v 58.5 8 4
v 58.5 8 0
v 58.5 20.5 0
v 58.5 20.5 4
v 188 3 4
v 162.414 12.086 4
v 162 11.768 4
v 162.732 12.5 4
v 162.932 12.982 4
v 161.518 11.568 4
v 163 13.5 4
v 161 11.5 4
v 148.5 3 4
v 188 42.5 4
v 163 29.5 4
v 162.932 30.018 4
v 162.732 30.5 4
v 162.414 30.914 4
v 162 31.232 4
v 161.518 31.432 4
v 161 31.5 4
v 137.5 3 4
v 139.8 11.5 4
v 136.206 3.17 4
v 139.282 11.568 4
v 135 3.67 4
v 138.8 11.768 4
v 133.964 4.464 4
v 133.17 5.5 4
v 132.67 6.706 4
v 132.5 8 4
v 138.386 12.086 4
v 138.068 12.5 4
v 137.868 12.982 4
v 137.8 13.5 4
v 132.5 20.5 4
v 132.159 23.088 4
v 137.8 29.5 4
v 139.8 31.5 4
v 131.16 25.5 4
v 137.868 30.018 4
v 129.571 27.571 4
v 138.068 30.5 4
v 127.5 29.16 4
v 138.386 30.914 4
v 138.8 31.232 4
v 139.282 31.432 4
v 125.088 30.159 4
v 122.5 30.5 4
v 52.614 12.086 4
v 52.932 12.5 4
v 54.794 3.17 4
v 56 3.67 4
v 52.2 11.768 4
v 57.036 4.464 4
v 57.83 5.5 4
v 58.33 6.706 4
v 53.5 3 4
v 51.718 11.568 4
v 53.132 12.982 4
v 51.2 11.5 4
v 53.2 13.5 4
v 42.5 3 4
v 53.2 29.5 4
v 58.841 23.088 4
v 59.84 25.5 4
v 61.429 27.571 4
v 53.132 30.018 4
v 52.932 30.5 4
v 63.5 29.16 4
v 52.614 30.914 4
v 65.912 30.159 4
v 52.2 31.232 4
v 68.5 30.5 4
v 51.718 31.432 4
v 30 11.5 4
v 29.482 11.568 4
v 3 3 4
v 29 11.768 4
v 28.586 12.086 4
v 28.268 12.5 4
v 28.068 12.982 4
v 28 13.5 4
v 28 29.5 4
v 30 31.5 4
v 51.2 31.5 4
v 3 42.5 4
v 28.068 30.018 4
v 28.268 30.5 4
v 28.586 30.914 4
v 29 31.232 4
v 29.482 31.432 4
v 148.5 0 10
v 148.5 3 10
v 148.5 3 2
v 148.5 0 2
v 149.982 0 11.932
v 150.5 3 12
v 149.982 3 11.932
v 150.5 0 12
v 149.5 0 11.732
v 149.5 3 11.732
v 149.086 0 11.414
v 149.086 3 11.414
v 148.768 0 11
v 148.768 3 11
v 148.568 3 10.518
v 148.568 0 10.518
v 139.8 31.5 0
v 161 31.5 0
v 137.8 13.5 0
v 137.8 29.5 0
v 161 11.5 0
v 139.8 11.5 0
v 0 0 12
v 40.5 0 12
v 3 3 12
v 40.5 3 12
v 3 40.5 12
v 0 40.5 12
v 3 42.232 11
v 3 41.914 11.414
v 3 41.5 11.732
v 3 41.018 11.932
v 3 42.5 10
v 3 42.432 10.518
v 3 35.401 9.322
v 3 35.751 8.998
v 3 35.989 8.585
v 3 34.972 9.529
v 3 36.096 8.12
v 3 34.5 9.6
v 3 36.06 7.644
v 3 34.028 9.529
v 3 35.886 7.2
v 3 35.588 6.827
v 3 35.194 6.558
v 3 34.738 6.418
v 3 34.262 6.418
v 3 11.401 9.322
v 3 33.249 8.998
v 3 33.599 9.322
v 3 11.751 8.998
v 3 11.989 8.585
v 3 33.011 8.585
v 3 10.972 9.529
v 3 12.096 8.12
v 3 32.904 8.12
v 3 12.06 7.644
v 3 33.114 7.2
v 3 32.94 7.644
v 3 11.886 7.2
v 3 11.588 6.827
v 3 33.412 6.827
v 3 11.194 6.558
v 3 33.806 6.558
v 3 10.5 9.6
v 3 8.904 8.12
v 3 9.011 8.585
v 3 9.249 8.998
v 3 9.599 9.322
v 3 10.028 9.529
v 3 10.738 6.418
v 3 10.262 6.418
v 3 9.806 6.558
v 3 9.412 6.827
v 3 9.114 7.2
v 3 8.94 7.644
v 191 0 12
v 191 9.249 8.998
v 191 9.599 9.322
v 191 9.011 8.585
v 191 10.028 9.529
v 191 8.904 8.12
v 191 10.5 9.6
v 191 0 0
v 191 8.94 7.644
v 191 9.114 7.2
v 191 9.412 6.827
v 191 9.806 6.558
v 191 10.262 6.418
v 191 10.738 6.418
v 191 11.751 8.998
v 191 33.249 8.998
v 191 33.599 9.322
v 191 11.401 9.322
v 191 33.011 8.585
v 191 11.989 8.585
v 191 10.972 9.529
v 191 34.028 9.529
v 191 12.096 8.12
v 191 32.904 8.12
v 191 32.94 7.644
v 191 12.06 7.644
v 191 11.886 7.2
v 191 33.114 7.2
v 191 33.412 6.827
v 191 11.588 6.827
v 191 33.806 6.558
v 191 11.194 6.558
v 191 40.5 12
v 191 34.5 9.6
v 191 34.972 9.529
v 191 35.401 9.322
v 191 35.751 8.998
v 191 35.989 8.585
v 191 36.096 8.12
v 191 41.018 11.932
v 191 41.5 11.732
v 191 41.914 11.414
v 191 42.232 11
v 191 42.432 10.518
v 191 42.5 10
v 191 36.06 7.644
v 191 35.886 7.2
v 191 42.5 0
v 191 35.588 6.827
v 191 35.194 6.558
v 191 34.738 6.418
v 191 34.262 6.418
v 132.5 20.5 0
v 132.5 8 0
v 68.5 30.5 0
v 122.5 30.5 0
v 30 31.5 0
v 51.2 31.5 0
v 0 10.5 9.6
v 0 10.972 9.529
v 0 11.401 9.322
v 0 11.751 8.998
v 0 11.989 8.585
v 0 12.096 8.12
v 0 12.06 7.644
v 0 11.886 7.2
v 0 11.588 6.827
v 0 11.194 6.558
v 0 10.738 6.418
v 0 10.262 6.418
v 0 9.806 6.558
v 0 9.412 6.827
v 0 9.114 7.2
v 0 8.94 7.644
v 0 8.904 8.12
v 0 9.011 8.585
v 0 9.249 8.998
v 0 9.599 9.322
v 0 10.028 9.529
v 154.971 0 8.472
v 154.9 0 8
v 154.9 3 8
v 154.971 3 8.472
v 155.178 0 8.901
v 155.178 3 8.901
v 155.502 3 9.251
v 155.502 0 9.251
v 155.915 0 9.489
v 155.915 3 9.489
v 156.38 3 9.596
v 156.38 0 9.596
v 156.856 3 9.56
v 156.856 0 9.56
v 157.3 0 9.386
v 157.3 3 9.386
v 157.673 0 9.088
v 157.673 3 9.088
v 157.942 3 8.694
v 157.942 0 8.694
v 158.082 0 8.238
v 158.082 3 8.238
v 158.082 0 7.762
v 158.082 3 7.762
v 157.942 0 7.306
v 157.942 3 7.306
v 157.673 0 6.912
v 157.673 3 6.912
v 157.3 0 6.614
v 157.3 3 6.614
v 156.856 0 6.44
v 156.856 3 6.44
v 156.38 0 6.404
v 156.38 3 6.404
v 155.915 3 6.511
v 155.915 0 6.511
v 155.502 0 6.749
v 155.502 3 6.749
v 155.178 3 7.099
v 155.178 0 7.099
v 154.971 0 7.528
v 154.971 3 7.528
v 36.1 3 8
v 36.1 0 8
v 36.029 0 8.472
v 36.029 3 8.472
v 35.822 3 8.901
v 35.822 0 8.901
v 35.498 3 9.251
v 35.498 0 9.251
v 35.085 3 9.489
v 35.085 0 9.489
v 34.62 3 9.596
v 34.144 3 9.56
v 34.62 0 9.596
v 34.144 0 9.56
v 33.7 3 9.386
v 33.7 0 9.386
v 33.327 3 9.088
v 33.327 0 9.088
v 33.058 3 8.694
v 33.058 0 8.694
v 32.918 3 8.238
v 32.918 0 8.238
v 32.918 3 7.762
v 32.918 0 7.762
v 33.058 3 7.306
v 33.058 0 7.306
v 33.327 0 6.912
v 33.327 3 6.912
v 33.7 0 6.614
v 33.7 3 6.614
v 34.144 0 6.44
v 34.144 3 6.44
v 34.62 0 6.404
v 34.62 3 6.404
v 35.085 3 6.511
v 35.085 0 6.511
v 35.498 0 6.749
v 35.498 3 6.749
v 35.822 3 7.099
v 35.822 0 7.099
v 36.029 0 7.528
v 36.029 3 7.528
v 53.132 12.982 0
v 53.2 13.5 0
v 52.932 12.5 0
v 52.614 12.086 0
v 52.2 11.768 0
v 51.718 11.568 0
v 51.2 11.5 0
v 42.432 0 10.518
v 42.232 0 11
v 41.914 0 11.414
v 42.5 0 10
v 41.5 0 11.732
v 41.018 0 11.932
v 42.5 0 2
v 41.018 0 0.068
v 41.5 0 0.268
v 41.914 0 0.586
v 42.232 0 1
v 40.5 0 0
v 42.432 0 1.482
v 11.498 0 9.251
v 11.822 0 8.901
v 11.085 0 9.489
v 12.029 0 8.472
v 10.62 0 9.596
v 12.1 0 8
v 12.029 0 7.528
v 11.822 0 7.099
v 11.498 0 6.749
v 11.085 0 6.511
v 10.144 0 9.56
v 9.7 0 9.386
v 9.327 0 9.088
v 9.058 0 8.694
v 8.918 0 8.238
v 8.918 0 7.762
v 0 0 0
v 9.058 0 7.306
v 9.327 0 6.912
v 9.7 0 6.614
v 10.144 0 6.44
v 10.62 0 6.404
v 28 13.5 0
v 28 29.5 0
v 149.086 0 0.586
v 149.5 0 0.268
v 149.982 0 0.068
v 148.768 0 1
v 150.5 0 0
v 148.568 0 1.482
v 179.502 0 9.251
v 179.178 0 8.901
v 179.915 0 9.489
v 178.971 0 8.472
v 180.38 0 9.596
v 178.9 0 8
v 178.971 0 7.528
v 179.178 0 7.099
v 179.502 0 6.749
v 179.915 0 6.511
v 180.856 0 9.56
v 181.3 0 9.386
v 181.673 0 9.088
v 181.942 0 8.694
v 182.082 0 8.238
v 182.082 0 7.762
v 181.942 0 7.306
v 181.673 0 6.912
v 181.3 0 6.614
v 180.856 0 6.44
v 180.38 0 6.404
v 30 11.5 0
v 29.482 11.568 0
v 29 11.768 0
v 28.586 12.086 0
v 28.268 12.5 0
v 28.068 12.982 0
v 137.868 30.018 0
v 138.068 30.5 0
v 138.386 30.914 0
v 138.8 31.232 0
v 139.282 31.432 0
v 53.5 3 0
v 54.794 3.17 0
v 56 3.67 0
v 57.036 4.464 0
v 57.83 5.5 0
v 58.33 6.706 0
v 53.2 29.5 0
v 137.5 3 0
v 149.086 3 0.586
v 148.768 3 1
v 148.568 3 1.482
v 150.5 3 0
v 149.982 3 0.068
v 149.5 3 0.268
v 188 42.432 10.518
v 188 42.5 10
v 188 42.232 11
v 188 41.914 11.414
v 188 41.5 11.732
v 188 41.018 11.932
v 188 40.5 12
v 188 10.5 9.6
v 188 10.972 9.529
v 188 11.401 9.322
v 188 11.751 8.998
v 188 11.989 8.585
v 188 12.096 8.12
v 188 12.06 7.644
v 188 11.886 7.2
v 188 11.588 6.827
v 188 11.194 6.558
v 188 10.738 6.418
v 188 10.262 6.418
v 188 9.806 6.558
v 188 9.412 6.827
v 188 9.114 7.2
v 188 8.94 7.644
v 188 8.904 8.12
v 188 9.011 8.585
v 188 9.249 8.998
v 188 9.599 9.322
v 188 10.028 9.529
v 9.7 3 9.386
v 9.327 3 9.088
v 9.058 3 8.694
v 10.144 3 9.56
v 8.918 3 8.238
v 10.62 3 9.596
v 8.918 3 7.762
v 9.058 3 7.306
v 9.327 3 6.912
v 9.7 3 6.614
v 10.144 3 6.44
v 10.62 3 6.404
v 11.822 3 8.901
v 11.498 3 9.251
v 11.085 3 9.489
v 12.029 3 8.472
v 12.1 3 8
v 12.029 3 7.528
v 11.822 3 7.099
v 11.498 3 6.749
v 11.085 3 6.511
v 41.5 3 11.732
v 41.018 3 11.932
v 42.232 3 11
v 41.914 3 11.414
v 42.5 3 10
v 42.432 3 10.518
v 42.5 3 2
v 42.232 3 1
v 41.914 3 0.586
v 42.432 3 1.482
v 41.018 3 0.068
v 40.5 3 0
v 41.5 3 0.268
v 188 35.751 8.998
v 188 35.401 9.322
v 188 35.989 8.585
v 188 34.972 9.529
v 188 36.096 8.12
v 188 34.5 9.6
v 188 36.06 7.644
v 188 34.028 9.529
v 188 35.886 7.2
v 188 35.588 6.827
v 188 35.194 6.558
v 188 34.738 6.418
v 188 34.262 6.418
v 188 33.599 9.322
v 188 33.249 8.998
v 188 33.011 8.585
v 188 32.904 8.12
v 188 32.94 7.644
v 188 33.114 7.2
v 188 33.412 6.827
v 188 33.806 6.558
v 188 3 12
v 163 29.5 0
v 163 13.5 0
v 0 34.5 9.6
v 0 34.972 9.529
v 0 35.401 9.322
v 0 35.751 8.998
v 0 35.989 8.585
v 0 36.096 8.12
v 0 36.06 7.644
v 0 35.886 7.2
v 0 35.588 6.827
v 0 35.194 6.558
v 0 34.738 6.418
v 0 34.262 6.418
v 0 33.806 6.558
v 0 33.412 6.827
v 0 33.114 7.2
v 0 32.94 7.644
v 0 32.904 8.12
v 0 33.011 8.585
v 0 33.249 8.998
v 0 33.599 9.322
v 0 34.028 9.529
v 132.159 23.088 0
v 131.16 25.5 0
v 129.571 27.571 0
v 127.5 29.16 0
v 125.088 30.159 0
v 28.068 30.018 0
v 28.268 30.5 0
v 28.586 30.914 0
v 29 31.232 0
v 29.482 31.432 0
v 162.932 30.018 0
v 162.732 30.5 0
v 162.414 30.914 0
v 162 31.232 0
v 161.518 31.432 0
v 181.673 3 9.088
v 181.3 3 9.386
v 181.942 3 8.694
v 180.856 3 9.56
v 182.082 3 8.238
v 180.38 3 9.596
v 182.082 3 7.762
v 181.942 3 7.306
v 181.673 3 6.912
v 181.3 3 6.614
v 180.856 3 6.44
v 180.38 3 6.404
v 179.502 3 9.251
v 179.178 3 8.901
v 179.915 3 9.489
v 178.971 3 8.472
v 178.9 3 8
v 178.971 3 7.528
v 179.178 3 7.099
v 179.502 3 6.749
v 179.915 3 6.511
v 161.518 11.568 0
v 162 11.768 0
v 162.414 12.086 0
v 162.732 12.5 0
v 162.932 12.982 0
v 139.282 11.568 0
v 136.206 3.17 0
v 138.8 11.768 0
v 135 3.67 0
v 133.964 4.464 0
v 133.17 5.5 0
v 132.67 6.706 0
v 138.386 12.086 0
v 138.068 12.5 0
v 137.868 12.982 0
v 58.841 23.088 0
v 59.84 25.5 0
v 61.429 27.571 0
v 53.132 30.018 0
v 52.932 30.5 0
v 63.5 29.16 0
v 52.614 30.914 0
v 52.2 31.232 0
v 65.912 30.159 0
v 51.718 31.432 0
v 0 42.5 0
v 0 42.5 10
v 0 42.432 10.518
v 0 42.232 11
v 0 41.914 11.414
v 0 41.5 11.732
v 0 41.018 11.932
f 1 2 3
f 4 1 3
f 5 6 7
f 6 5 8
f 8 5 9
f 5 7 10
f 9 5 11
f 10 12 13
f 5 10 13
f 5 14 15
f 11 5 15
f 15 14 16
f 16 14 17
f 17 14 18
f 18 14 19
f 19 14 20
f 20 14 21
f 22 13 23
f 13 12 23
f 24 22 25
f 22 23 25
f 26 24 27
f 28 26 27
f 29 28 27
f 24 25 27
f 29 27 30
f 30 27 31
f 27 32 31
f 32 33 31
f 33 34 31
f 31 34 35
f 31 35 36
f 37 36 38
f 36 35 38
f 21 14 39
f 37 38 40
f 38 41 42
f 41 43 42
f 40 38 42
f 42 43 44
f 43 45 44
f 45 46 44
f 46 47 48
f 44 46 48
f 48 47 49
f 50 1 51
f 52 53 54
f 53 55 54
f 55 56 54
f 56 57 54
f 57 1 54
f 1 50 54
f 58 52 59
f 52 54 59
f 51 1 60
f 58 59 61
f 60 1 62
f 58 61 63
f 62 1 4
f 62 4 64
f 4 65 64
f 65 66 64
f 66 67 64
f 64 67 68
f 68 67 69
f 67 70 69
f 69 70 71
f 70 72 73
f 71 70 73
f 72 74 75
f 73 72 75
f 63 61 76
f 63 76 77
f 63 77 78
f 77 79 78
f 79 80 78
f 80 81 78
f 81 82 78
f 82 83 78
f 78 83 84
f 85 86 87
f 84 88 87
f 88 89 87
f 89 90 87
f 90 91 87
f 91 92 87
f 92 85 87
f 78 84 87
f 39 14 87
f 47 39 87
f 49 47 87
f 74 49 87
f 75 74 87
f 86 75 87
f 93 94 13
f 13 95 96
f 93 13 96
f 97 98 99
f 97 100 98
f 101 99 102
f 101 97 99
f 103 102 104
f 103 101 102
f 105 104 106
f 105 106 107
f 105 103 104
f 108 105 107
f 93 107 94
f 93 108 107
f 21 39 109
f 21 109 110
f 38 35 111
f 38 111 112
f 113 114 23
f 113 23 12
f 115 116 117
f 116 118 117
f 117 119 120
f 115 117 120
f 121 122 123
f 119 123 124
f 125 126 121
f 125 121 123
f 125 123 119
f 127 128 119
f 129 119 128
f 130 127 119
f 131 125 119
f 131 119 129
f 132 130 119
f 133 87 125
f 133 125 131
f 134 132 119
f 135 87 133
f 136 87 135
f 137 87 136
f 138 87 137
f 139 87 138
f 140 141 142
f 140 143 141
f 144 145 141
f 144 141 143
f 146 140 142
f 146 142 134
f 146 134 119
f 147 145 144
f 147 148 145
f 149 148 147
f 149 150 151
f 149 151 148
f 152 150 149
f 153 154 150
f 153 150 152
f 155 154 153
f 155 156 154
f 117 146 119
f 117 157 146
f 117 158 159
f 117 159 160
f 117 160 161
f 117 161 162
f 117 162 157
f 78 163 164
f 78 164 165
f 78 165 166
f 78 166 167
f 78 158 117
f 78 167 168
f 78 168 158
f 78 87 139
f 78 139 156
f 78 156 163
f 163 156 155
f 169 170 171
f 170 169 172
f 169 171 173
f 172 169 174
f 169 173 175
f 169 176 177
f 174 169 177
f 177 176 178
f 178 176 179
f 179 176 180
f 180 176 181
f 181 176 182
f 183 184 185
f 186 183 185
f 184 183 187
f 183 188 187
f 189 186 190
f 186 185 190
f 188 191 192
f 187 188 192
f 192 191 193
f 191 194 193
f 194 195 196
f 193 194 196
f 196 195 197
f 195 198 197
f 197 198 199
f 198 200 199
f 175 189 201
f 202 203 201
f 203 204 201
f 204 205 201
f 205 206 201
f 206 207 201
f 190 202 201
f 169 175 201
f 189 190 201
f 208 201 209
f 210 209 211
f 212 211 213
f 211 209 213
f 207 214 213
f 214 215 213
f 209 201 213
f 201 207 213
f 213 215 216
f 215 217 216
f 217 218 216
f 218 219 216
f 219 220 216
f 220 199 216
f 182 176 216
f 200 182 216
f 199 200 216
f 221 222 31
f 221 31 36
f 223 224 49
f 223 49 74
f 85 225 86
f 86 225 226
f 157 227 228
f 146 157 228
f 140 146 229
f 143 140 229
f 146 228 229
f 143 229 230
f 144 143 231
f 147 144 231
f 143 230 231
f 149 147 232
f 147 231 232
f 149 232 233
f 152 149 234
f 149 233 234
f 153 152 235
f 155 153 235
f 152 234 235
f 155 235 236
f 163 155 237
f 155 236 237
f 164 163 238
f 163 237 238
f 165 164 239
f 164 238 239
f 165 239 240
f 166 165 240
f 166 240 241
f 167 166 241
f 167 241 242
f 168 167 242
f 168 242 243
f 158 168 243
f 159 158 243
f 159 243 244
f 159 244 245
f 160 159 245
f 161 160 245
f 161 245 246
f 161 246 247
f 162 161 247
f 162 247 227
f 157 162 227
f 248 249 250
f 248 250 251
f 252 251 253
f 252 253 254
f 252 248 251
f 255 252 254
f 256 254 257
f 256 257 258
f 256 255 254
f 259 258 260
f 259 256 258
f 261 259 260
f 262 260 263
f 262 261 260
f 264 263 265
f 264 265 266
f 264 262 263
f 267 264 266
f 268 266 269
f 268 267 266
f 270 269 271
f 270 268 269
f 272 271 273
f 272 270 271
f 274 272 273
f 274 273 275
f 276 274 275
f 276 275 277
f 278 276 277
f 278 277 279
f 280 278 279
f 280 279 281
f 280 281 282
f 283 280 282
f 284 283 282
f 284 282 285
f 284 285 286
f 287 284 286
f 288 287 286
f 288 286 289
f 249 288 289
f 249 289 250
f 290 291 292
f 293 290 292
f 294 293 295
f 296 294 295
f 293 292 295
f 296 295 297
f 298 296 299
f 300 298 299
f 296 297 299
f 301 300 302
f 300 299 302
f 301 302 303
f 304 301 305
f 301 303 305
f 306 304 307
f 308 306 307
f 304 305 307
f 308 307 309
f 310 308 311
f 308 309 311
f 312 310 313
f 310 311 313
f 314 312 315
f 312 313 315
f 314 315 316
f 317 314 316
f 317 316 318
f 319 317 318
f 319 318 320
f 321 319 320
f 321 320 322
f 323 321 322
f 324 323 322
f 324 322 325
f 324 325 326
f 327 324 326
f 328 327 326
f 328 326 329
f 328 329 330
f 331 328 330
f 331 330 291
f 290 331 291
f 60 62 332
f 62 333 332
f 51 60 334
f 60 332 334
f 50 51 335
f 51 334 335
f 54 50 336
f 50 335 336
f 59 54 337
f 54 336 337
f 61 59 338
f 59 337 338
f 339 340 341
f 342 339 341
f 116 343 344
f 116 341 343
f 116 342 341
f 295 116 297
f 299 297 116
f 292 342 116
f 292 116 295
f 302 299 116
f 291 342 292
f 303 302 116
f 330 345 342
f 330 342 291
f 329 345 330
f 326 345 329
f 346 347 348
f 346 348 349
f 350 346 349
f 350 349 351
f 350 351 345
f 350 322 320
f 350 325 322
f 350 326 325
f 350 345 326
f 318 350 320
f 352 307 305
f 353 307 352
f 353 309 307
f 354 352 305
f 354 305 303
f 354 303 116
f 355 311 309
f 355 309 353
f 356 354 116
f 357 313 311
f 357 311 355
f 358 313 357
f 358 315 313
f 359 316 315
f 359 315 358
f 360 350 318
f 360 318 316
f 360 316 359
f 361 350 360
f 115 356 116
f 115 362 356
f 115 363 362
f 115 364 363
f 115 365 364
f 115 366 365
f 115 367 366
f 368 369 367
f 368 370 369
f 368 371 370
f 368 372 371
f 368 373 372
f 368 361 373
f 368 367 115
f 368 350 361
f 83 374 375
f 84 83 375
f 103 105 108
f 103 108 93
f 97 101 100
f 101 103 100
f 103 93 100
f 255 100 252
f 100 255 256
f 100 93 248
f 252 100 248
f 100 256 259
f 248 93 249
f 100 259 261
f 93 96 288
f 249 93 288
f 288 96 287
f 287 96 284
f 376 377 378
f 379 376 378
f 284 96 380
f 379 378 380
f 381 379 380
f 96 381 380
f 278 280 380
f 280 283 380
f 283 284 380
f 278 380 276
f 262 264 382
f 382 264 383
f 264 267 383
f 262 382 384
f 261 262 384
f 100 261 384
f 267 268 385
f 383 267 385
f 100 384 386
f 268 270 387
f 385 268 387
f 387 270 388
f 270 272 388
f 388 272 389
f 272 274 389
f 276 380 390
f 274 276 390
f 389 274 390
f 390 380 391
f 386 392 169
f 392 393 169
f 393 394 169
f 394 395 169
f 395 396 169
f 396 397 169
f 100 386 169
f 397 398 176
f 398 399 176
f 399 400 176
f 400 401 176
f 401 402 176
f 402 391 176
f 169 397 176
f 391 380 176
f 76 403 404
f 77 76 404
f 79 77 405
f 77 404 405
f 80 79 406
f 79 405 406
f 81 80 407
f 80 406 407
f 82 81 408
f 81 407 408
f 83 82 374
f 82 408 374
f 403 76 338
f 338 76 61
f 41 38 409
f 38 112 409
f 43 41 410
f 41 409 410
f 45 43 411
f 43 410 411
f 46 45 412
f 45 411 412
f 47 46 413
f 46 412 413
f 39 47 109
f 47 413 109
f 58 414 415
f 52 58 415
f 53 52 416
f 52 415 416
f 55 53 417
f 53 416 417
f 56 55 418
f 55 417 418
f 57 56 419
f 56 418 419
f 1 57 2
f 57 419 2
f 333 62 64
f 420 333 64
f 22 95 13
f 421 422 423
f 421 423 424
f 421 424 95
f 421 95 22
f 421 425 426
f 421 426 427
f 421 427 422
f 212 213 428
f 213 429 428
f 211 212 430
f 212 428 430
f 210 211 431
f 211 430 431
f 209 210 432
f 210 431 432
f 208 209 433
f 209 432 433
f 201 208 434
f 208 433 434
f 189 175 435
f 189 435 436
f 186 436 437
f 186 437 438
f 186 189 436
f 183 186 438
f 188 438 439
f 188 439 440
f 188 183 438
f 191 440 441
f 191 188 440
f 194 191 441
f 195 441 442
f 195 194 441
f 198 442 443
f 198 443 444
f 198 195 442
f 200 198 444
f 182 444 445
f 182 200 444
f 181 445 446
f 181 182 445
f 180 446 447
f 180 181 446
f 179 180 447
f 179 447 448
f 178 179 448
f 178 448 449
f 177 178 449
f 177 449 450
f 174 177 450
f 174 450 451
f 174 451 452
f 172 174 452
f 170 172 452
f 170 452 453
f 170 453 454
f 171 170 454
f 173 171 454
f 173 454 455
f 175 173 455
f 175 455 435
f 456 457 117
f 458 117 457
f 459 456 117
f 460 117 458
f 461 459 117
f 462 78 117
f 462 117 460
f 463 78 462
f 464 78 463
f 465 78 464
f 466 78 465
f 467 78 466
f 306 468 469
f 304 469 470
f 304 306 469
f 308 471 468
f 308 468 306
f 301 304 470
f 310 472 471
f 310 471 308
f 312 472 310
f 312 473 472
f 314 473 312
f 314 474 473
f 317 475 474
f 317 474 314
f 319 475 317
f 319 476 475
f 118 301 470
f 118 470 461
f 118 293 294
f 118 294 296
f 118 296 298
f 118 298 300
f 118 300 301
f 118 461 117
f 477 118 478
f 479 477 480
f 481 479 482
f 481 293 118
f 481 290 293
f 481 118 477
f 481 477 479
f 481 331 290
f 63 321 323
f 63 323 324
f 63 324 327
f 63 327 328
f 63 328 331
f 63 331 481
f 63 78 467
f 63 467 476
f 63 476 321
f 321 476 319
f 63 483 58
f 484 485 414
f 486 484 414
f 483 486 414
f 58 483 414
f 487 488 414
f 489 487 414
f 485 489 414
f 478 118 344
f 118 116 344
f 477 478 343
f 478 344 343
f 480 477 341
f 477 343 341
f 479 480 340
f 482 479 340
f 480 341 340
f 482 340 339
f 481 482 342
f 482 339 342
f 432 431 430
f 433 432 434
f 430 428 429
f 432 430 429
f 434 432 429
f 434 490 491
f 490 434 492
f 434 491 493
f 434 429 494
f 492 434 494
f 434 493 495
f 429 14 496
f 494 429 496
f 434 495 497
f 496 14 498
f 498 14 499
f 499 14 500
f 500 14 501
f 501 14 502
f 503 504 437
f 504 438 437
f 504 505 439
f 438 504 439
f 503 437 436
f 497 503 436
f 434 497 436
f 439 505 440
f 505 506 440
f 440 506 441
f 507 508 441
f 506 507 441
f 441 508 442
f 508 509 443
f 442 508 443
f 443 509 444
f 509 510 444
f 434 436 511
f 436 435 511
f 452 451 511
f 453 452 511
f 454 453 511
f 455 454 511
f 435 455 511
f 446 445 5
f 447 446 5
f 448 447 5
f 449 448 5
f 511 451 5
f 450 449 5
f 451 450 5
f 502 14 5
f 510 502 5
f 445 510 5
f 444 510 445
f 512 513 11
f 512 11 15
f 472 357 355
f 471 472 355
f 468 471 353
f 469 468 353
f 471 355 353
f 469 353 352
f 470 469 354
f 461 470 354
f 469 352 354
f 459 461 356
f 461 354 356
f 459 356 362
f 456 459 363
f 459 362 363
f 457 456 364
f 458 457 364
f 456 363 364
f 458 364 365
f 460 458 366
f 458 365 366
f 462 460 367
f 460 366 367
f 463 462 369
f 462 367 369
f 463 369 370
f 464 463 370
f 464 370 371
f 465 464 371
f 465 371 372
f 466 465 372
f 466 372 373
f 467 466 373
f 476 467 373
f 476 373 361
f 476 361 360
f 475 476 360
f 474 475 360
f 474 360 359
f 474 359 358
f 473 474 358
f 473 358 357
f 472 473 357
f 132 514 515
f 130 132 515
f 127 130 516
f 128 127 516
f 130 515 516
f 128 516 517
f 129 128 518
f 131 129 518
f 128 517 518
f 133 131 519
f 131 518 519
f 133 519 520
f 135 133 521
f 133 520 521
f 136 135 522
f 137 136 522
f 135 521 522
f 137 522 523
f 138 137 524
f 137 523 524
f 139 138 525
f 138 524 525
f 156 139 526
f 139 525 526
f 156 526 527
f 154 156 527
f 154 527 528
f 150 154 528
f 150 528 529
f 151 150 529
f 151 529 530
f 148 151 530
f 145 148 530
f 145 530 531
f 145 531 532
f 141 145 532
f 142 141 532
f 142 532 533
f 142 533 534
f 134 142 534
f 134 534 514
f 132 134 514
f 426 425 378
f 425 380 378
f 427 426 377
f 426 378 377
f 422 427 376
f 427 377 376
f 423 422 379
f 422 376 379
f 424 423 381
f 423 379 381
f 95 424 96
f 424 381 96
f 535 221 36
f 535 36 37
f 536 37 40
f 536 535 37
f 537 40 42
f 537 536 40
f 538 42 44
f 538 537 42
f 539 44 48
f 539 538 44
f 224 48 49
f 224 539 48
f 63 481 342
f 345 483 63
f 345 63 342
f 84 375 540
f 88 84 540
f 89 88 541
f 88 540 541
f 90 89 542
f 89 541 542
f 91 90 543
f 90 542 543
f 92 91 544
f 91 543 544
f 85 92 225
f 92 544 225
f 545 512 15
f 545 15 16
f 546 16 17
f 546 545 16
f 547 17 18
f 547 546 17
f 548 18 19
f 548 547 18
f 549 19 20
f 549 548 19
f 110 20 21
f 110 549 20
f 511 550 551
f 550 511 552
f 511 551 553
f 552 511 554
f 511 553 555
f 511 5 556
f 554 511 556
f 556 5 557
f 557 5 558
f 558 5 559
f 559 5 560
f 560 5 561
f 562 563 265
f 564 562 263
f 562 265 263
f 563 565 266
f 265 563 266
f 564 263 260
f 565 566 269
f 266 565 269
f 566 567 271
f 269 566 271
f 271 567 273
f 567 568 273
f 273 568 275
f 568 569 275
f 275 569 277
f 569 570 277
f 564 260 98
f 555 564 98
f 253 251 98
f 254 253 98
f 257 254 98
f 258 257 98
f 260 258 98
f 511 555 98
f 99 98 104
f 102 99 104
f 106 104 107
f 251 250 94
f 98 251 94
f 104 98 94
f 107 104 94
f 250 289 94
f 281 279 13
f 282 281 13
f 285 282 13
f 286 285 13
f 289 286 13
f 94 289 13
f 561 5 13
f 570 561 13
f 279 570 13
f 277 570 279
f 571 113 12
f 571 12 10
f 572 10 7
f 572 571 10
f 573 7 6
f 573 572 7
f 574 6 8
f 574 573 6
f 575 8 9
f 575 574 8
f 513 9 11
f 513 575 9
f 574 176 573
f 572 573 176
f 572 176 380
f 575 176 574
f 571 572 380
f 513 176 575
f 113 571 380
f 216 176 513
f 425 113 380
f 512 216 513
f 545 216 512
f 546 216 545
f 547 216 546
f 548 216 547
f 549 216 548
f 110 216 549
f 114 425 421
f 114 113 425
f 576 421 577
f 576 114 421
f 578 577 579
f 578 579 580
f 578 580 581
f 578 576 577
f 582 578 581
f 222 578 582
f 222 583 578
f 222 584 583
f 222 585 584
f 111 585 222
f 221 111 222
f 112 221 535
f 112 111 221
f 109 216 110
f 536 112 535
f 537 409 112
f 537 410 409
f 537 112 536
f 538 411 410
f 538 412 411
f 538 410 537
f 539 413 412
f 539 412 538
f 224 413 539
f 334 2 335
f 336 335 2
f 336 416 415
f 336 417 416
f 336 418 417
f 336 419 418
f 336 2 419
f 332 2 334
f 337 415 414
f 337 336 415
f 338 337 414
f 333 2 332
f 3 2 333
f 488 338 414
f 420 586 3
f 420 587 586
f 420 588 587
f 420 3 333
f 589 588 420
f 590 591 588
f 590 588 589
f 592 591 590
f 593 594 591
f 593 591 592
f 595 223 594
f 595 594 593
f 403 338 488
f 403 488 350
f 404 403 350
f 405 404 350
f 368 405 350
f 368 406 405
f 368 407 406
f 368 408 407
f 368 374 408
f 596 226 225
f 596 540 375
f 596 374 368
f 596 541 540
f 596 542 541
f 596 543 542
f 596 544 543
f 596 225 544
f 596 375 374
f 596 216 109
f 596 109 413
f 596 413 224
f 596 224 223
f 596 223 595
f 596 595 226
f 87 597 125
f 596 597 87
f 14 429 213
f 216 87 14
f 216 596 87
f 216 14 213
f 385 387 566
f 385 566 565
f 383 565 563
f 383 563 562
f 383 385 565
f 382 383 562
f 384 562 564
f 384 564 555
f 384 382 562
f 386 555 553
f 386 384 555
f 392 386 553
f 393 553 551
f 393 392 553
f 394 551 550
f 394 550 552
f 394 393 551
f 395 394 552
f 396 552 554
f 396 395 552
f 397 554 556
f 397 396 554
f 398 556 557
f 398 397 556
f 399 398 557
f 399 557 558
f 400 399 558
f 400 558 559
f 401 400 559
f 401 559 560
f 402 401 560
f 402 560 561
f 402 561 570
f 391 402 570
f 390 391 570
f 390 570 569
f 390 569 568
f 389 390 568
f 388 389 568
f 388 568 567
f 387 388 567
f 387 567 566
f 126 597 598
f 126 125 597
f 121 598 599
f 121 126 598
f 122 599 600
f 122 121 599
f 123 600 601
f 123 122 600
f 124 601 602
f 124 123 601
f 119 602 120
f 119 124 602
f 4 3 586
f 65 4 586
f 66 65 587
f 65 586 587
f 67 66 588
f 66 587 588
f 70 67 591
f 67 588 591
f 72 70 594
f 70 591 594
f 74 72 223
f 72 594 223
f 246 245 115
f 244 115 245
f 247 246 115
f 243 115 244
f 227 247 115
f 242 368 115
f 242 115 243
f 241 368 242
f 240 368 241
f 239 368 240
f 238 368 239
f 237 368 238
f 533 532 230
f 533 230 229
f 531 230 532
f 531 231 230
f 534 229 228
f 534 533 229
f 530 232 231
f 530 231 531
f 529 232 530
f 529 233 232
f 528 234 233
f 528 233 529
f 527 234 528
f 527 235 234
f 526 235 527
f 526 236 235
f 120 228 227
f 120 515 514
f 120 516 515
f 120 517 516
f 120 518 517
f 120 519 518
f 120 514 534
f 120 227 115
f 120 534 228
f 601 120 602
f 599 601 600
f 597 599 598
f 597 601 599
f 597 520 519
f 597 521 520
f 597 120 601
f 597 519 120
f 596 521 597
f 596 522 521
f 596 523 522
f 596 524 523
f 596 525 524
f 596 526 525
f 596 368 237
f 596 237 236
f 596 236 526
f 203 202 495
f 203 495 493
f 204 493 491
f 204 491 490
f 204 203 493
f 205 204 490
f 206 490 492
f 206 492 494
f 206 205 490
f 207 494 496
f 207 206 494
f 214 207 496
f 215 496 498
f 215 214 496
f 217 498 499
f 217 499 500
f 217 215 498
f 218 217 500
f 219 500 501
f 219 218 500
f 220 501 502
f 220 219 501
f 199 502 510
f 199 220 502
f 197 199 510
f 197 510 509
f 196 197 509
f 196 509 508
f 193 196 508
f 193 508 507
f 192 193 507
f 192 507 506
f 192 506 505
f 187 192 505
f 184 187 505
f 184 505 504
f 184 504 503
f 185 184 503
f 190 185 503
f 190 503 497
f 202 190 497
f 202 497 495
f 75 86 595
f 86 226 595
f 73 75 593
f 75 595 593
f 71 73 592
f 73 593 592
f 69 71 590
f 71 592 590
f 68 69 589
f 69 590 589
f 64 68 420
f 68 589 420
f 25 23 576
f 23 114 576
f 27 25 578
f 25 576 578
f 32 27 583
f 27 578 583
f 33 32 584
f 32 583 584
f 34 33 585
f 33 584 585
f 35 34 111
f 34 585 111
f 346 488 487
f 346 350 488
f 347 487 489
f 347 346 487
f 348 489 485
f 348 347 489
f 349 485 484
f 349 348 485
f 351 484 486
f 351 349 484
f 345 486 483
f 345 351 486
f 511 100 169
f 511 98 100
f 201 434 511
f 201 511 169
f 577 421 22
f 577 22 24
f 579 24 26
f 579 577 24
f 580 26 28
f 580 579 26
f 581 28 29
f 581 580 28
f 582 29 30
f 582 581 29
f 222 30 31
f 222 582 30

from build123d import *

# Parameters (mm, degrees)
EXTRUDE_1_DEPTH     = 12
EXTRUDE_2_DEPTH     = 4
CUT_EXTRUDE_1_REACH = 107.216
SKETCH_3_R          = 1.6
CUT_EXTRUDE_2_REACH = 107.216
SKETCH_4_R          = 1.6
FILLET_2_R          = 2
SKETCH_5_W          = 11.2
SKETCH_5_H          = 20
CUT_EXTRUDE_3_DEPTH = 20
FILLET_4_R          = 2


with BuildPart() as part:
    # 草图1 → 凸台-拉伸1 (new body)
    with BuildSketch(Plane.XY):
        Polygon((0, 42.5), (0, 0), (42.5, 0), (42.5, 3), (3, 3), (3, 42.5), align=None)
    extrude(amount=EXTRUDE_1_DEPTH)

    # 草图1<6> → 凸台-拉伸2 (add)
    with BuildSketch(Plane.XY):
        with BuildLine():
            Line((95.5, 42.5), (3, 42.5))
            Line((3, 42.5), (3, 3))
            Line((3, 3), (42.5, 3))
            Line((42.5, 3), (53.5, 3))
            ThreePointArc((53.5, 3), (57.035533906, 4.464466094), (58.5, 8))
            Line((58.5, 8), (58.5, 20.5))
            ThreePointArc((58.5, 20.5), (61.428932188, 27.571067812), (68.5, 30.5))
            Line((68.5, 30.5), (95.5, 30.5))
            Line((95.5, 30.5), (95.5, 42.5))
        make_face()
        with BuildLine():
            ThreePointArc((28, 29.5), (28.585786438, 30.914213562), (30, 31.5))
            Line((30, 31.5), (42, 31.5))
            ThreePointArc((42, 31.5), (43.414213562, 30.914213562), (44, 29.5))
            Line((44, 29.5), (44, 13.5))
            ThreePointArc((44, 13.5), (43.414213562, 12.085786438), (42, 11.5))
            Line((42, 11.5), (30, 11.5))
            ThreePointArc((30, 11.5), (28.585786438, 12.085786438), (28, 13.5))
            Line((28, 13.5), (28, 29.5))
        make_face(mode=Mode.SUBTRACT)
    extrude(amount=EXTRUDE_2_DEPTH)

    # 草图3 → 切除-拉伸1 (cut, up to next)
    with BuildSketch(Plane.ZY, mode=Mode.PRIVATE) as cut_extrude_1_sk1:
        with Locations((8, 10.5)):
            Circle(SKETCH_3_R)
    cut_extrude_1_tool1 = extrude(cut_extrude_1_sk1.sketch, amount=-CUT_EXTRUDE_1_REACH, mode=Mode.PRIVATE) & part.part
    # 草图3 → 切除-拉伸1 (cut, up to next)
    with BuildSketch(Plane.ZY, mode=Mode.PRIVATE) as cut_extrude_1_sk2:
        with Locations((8, 34.5)):
            Circle(SKETCH_3_R)
    cut_extrude_1_tool2 = extrude(cut_extrude_1_sk2.sketch, amount=-CUT_EXTRUDE_1_REACH, mode=Mode.PRIVATE) & part.part
    add(cut_extrude_1_tool1.solids().sort_by_distance((0, 10.5, 8))[0], mode=Mode.SUBTRACT)
    add(cut_extrude_1_tool2.solids().sort_by_distance((0, 34.5, 8))[0], mode=Mode.SUBTRACT)

    # 草图4 → 切除-拉伸2 (cut, up to next)
    with BuildSketch(Plane.XZ, mode=Mode.PRIVATE) as cut_extrude_2_sk1:
        with Locations((10.5, 8)):
            Circle(SKETCH_4_R)
    cut_extrude_2_tool1 = extrude(cut_extrude_2_sk1.sketch, amount=-CUT_EXTRUDE_2_REACH, mode=Mode.PRIVATE) & part.part
    # 草图4 → 切除-拉伸2 (cut, up to next)
    with BuildSketch(Plane.XZ, mode=Mode.PRIVATE) as cut_extrude_2_sk2:
        with Locations((34.5, 8)):
            Circle(SKETCH_4_R)
    cut_extrude_2_tool2 = extrude(cut_extrude_2_sk2.sketch, amount=-CUT_EXTRUDE_2_REACH, mode=Mode.PRIVATE) & part.part
    add(cut_extrude_2_tool1.solids().sort_by_distance((10.5, 0, 8))[0], mode=Mode.SUBTRACT)
    add(cut_extrude_2_tool2.solids().sort_by_distance((34.5, 0, 8))[0], mode=Mode.SUBTRACT)

    # 圆角2
    fillet_2_edges = [part.edges().sort_by_distance(p)[0] for p in [
        (1.5, 42.5, 12),
        (42.5, 1.5, 0),
        (42.5, 1.5, 12),
    ]]
    fillet(fillet_2_edges, radius=FILLET_2_R)

    # 镜向1: part across plane


with BuildPart() as part_1:
    add(part.part)
    add(part.part.mirror(Plane(origin=(95.5, 0, 4), x_dir=(0, 0, 1), z_dir=(-1, 0, 0))))

    # 草图5 → 切除-拉伸3 (cut)
    with BuildSketch(Plane.XY.offset(4)):
        with Locations((47.6, 21.5)):
            Rectangle(SKETCH_5_W, SKETCH_5_H)
        with Locations((143.4, 21.5)):
            Rectangle(SKETCH_5_W, SKETCH_5_H)
    extrude(amount=-CUT_EXTRUDE_3_DEPTH, mode=Mode.SUBTRACT)

    # 圆角4
    fillet_4_edges = [part_1.edges().sort_by_distance(p)[0] for p in [
        (137.8, 31.5, 2),
        (137.8, 11.5, 2),
        (53.2, 11.5, 2),
        (53.2, 31.5, 2),
    ]]
    fillet(fillet_4_edges, radius=FILLET_4_R)


solid = part_1.part
